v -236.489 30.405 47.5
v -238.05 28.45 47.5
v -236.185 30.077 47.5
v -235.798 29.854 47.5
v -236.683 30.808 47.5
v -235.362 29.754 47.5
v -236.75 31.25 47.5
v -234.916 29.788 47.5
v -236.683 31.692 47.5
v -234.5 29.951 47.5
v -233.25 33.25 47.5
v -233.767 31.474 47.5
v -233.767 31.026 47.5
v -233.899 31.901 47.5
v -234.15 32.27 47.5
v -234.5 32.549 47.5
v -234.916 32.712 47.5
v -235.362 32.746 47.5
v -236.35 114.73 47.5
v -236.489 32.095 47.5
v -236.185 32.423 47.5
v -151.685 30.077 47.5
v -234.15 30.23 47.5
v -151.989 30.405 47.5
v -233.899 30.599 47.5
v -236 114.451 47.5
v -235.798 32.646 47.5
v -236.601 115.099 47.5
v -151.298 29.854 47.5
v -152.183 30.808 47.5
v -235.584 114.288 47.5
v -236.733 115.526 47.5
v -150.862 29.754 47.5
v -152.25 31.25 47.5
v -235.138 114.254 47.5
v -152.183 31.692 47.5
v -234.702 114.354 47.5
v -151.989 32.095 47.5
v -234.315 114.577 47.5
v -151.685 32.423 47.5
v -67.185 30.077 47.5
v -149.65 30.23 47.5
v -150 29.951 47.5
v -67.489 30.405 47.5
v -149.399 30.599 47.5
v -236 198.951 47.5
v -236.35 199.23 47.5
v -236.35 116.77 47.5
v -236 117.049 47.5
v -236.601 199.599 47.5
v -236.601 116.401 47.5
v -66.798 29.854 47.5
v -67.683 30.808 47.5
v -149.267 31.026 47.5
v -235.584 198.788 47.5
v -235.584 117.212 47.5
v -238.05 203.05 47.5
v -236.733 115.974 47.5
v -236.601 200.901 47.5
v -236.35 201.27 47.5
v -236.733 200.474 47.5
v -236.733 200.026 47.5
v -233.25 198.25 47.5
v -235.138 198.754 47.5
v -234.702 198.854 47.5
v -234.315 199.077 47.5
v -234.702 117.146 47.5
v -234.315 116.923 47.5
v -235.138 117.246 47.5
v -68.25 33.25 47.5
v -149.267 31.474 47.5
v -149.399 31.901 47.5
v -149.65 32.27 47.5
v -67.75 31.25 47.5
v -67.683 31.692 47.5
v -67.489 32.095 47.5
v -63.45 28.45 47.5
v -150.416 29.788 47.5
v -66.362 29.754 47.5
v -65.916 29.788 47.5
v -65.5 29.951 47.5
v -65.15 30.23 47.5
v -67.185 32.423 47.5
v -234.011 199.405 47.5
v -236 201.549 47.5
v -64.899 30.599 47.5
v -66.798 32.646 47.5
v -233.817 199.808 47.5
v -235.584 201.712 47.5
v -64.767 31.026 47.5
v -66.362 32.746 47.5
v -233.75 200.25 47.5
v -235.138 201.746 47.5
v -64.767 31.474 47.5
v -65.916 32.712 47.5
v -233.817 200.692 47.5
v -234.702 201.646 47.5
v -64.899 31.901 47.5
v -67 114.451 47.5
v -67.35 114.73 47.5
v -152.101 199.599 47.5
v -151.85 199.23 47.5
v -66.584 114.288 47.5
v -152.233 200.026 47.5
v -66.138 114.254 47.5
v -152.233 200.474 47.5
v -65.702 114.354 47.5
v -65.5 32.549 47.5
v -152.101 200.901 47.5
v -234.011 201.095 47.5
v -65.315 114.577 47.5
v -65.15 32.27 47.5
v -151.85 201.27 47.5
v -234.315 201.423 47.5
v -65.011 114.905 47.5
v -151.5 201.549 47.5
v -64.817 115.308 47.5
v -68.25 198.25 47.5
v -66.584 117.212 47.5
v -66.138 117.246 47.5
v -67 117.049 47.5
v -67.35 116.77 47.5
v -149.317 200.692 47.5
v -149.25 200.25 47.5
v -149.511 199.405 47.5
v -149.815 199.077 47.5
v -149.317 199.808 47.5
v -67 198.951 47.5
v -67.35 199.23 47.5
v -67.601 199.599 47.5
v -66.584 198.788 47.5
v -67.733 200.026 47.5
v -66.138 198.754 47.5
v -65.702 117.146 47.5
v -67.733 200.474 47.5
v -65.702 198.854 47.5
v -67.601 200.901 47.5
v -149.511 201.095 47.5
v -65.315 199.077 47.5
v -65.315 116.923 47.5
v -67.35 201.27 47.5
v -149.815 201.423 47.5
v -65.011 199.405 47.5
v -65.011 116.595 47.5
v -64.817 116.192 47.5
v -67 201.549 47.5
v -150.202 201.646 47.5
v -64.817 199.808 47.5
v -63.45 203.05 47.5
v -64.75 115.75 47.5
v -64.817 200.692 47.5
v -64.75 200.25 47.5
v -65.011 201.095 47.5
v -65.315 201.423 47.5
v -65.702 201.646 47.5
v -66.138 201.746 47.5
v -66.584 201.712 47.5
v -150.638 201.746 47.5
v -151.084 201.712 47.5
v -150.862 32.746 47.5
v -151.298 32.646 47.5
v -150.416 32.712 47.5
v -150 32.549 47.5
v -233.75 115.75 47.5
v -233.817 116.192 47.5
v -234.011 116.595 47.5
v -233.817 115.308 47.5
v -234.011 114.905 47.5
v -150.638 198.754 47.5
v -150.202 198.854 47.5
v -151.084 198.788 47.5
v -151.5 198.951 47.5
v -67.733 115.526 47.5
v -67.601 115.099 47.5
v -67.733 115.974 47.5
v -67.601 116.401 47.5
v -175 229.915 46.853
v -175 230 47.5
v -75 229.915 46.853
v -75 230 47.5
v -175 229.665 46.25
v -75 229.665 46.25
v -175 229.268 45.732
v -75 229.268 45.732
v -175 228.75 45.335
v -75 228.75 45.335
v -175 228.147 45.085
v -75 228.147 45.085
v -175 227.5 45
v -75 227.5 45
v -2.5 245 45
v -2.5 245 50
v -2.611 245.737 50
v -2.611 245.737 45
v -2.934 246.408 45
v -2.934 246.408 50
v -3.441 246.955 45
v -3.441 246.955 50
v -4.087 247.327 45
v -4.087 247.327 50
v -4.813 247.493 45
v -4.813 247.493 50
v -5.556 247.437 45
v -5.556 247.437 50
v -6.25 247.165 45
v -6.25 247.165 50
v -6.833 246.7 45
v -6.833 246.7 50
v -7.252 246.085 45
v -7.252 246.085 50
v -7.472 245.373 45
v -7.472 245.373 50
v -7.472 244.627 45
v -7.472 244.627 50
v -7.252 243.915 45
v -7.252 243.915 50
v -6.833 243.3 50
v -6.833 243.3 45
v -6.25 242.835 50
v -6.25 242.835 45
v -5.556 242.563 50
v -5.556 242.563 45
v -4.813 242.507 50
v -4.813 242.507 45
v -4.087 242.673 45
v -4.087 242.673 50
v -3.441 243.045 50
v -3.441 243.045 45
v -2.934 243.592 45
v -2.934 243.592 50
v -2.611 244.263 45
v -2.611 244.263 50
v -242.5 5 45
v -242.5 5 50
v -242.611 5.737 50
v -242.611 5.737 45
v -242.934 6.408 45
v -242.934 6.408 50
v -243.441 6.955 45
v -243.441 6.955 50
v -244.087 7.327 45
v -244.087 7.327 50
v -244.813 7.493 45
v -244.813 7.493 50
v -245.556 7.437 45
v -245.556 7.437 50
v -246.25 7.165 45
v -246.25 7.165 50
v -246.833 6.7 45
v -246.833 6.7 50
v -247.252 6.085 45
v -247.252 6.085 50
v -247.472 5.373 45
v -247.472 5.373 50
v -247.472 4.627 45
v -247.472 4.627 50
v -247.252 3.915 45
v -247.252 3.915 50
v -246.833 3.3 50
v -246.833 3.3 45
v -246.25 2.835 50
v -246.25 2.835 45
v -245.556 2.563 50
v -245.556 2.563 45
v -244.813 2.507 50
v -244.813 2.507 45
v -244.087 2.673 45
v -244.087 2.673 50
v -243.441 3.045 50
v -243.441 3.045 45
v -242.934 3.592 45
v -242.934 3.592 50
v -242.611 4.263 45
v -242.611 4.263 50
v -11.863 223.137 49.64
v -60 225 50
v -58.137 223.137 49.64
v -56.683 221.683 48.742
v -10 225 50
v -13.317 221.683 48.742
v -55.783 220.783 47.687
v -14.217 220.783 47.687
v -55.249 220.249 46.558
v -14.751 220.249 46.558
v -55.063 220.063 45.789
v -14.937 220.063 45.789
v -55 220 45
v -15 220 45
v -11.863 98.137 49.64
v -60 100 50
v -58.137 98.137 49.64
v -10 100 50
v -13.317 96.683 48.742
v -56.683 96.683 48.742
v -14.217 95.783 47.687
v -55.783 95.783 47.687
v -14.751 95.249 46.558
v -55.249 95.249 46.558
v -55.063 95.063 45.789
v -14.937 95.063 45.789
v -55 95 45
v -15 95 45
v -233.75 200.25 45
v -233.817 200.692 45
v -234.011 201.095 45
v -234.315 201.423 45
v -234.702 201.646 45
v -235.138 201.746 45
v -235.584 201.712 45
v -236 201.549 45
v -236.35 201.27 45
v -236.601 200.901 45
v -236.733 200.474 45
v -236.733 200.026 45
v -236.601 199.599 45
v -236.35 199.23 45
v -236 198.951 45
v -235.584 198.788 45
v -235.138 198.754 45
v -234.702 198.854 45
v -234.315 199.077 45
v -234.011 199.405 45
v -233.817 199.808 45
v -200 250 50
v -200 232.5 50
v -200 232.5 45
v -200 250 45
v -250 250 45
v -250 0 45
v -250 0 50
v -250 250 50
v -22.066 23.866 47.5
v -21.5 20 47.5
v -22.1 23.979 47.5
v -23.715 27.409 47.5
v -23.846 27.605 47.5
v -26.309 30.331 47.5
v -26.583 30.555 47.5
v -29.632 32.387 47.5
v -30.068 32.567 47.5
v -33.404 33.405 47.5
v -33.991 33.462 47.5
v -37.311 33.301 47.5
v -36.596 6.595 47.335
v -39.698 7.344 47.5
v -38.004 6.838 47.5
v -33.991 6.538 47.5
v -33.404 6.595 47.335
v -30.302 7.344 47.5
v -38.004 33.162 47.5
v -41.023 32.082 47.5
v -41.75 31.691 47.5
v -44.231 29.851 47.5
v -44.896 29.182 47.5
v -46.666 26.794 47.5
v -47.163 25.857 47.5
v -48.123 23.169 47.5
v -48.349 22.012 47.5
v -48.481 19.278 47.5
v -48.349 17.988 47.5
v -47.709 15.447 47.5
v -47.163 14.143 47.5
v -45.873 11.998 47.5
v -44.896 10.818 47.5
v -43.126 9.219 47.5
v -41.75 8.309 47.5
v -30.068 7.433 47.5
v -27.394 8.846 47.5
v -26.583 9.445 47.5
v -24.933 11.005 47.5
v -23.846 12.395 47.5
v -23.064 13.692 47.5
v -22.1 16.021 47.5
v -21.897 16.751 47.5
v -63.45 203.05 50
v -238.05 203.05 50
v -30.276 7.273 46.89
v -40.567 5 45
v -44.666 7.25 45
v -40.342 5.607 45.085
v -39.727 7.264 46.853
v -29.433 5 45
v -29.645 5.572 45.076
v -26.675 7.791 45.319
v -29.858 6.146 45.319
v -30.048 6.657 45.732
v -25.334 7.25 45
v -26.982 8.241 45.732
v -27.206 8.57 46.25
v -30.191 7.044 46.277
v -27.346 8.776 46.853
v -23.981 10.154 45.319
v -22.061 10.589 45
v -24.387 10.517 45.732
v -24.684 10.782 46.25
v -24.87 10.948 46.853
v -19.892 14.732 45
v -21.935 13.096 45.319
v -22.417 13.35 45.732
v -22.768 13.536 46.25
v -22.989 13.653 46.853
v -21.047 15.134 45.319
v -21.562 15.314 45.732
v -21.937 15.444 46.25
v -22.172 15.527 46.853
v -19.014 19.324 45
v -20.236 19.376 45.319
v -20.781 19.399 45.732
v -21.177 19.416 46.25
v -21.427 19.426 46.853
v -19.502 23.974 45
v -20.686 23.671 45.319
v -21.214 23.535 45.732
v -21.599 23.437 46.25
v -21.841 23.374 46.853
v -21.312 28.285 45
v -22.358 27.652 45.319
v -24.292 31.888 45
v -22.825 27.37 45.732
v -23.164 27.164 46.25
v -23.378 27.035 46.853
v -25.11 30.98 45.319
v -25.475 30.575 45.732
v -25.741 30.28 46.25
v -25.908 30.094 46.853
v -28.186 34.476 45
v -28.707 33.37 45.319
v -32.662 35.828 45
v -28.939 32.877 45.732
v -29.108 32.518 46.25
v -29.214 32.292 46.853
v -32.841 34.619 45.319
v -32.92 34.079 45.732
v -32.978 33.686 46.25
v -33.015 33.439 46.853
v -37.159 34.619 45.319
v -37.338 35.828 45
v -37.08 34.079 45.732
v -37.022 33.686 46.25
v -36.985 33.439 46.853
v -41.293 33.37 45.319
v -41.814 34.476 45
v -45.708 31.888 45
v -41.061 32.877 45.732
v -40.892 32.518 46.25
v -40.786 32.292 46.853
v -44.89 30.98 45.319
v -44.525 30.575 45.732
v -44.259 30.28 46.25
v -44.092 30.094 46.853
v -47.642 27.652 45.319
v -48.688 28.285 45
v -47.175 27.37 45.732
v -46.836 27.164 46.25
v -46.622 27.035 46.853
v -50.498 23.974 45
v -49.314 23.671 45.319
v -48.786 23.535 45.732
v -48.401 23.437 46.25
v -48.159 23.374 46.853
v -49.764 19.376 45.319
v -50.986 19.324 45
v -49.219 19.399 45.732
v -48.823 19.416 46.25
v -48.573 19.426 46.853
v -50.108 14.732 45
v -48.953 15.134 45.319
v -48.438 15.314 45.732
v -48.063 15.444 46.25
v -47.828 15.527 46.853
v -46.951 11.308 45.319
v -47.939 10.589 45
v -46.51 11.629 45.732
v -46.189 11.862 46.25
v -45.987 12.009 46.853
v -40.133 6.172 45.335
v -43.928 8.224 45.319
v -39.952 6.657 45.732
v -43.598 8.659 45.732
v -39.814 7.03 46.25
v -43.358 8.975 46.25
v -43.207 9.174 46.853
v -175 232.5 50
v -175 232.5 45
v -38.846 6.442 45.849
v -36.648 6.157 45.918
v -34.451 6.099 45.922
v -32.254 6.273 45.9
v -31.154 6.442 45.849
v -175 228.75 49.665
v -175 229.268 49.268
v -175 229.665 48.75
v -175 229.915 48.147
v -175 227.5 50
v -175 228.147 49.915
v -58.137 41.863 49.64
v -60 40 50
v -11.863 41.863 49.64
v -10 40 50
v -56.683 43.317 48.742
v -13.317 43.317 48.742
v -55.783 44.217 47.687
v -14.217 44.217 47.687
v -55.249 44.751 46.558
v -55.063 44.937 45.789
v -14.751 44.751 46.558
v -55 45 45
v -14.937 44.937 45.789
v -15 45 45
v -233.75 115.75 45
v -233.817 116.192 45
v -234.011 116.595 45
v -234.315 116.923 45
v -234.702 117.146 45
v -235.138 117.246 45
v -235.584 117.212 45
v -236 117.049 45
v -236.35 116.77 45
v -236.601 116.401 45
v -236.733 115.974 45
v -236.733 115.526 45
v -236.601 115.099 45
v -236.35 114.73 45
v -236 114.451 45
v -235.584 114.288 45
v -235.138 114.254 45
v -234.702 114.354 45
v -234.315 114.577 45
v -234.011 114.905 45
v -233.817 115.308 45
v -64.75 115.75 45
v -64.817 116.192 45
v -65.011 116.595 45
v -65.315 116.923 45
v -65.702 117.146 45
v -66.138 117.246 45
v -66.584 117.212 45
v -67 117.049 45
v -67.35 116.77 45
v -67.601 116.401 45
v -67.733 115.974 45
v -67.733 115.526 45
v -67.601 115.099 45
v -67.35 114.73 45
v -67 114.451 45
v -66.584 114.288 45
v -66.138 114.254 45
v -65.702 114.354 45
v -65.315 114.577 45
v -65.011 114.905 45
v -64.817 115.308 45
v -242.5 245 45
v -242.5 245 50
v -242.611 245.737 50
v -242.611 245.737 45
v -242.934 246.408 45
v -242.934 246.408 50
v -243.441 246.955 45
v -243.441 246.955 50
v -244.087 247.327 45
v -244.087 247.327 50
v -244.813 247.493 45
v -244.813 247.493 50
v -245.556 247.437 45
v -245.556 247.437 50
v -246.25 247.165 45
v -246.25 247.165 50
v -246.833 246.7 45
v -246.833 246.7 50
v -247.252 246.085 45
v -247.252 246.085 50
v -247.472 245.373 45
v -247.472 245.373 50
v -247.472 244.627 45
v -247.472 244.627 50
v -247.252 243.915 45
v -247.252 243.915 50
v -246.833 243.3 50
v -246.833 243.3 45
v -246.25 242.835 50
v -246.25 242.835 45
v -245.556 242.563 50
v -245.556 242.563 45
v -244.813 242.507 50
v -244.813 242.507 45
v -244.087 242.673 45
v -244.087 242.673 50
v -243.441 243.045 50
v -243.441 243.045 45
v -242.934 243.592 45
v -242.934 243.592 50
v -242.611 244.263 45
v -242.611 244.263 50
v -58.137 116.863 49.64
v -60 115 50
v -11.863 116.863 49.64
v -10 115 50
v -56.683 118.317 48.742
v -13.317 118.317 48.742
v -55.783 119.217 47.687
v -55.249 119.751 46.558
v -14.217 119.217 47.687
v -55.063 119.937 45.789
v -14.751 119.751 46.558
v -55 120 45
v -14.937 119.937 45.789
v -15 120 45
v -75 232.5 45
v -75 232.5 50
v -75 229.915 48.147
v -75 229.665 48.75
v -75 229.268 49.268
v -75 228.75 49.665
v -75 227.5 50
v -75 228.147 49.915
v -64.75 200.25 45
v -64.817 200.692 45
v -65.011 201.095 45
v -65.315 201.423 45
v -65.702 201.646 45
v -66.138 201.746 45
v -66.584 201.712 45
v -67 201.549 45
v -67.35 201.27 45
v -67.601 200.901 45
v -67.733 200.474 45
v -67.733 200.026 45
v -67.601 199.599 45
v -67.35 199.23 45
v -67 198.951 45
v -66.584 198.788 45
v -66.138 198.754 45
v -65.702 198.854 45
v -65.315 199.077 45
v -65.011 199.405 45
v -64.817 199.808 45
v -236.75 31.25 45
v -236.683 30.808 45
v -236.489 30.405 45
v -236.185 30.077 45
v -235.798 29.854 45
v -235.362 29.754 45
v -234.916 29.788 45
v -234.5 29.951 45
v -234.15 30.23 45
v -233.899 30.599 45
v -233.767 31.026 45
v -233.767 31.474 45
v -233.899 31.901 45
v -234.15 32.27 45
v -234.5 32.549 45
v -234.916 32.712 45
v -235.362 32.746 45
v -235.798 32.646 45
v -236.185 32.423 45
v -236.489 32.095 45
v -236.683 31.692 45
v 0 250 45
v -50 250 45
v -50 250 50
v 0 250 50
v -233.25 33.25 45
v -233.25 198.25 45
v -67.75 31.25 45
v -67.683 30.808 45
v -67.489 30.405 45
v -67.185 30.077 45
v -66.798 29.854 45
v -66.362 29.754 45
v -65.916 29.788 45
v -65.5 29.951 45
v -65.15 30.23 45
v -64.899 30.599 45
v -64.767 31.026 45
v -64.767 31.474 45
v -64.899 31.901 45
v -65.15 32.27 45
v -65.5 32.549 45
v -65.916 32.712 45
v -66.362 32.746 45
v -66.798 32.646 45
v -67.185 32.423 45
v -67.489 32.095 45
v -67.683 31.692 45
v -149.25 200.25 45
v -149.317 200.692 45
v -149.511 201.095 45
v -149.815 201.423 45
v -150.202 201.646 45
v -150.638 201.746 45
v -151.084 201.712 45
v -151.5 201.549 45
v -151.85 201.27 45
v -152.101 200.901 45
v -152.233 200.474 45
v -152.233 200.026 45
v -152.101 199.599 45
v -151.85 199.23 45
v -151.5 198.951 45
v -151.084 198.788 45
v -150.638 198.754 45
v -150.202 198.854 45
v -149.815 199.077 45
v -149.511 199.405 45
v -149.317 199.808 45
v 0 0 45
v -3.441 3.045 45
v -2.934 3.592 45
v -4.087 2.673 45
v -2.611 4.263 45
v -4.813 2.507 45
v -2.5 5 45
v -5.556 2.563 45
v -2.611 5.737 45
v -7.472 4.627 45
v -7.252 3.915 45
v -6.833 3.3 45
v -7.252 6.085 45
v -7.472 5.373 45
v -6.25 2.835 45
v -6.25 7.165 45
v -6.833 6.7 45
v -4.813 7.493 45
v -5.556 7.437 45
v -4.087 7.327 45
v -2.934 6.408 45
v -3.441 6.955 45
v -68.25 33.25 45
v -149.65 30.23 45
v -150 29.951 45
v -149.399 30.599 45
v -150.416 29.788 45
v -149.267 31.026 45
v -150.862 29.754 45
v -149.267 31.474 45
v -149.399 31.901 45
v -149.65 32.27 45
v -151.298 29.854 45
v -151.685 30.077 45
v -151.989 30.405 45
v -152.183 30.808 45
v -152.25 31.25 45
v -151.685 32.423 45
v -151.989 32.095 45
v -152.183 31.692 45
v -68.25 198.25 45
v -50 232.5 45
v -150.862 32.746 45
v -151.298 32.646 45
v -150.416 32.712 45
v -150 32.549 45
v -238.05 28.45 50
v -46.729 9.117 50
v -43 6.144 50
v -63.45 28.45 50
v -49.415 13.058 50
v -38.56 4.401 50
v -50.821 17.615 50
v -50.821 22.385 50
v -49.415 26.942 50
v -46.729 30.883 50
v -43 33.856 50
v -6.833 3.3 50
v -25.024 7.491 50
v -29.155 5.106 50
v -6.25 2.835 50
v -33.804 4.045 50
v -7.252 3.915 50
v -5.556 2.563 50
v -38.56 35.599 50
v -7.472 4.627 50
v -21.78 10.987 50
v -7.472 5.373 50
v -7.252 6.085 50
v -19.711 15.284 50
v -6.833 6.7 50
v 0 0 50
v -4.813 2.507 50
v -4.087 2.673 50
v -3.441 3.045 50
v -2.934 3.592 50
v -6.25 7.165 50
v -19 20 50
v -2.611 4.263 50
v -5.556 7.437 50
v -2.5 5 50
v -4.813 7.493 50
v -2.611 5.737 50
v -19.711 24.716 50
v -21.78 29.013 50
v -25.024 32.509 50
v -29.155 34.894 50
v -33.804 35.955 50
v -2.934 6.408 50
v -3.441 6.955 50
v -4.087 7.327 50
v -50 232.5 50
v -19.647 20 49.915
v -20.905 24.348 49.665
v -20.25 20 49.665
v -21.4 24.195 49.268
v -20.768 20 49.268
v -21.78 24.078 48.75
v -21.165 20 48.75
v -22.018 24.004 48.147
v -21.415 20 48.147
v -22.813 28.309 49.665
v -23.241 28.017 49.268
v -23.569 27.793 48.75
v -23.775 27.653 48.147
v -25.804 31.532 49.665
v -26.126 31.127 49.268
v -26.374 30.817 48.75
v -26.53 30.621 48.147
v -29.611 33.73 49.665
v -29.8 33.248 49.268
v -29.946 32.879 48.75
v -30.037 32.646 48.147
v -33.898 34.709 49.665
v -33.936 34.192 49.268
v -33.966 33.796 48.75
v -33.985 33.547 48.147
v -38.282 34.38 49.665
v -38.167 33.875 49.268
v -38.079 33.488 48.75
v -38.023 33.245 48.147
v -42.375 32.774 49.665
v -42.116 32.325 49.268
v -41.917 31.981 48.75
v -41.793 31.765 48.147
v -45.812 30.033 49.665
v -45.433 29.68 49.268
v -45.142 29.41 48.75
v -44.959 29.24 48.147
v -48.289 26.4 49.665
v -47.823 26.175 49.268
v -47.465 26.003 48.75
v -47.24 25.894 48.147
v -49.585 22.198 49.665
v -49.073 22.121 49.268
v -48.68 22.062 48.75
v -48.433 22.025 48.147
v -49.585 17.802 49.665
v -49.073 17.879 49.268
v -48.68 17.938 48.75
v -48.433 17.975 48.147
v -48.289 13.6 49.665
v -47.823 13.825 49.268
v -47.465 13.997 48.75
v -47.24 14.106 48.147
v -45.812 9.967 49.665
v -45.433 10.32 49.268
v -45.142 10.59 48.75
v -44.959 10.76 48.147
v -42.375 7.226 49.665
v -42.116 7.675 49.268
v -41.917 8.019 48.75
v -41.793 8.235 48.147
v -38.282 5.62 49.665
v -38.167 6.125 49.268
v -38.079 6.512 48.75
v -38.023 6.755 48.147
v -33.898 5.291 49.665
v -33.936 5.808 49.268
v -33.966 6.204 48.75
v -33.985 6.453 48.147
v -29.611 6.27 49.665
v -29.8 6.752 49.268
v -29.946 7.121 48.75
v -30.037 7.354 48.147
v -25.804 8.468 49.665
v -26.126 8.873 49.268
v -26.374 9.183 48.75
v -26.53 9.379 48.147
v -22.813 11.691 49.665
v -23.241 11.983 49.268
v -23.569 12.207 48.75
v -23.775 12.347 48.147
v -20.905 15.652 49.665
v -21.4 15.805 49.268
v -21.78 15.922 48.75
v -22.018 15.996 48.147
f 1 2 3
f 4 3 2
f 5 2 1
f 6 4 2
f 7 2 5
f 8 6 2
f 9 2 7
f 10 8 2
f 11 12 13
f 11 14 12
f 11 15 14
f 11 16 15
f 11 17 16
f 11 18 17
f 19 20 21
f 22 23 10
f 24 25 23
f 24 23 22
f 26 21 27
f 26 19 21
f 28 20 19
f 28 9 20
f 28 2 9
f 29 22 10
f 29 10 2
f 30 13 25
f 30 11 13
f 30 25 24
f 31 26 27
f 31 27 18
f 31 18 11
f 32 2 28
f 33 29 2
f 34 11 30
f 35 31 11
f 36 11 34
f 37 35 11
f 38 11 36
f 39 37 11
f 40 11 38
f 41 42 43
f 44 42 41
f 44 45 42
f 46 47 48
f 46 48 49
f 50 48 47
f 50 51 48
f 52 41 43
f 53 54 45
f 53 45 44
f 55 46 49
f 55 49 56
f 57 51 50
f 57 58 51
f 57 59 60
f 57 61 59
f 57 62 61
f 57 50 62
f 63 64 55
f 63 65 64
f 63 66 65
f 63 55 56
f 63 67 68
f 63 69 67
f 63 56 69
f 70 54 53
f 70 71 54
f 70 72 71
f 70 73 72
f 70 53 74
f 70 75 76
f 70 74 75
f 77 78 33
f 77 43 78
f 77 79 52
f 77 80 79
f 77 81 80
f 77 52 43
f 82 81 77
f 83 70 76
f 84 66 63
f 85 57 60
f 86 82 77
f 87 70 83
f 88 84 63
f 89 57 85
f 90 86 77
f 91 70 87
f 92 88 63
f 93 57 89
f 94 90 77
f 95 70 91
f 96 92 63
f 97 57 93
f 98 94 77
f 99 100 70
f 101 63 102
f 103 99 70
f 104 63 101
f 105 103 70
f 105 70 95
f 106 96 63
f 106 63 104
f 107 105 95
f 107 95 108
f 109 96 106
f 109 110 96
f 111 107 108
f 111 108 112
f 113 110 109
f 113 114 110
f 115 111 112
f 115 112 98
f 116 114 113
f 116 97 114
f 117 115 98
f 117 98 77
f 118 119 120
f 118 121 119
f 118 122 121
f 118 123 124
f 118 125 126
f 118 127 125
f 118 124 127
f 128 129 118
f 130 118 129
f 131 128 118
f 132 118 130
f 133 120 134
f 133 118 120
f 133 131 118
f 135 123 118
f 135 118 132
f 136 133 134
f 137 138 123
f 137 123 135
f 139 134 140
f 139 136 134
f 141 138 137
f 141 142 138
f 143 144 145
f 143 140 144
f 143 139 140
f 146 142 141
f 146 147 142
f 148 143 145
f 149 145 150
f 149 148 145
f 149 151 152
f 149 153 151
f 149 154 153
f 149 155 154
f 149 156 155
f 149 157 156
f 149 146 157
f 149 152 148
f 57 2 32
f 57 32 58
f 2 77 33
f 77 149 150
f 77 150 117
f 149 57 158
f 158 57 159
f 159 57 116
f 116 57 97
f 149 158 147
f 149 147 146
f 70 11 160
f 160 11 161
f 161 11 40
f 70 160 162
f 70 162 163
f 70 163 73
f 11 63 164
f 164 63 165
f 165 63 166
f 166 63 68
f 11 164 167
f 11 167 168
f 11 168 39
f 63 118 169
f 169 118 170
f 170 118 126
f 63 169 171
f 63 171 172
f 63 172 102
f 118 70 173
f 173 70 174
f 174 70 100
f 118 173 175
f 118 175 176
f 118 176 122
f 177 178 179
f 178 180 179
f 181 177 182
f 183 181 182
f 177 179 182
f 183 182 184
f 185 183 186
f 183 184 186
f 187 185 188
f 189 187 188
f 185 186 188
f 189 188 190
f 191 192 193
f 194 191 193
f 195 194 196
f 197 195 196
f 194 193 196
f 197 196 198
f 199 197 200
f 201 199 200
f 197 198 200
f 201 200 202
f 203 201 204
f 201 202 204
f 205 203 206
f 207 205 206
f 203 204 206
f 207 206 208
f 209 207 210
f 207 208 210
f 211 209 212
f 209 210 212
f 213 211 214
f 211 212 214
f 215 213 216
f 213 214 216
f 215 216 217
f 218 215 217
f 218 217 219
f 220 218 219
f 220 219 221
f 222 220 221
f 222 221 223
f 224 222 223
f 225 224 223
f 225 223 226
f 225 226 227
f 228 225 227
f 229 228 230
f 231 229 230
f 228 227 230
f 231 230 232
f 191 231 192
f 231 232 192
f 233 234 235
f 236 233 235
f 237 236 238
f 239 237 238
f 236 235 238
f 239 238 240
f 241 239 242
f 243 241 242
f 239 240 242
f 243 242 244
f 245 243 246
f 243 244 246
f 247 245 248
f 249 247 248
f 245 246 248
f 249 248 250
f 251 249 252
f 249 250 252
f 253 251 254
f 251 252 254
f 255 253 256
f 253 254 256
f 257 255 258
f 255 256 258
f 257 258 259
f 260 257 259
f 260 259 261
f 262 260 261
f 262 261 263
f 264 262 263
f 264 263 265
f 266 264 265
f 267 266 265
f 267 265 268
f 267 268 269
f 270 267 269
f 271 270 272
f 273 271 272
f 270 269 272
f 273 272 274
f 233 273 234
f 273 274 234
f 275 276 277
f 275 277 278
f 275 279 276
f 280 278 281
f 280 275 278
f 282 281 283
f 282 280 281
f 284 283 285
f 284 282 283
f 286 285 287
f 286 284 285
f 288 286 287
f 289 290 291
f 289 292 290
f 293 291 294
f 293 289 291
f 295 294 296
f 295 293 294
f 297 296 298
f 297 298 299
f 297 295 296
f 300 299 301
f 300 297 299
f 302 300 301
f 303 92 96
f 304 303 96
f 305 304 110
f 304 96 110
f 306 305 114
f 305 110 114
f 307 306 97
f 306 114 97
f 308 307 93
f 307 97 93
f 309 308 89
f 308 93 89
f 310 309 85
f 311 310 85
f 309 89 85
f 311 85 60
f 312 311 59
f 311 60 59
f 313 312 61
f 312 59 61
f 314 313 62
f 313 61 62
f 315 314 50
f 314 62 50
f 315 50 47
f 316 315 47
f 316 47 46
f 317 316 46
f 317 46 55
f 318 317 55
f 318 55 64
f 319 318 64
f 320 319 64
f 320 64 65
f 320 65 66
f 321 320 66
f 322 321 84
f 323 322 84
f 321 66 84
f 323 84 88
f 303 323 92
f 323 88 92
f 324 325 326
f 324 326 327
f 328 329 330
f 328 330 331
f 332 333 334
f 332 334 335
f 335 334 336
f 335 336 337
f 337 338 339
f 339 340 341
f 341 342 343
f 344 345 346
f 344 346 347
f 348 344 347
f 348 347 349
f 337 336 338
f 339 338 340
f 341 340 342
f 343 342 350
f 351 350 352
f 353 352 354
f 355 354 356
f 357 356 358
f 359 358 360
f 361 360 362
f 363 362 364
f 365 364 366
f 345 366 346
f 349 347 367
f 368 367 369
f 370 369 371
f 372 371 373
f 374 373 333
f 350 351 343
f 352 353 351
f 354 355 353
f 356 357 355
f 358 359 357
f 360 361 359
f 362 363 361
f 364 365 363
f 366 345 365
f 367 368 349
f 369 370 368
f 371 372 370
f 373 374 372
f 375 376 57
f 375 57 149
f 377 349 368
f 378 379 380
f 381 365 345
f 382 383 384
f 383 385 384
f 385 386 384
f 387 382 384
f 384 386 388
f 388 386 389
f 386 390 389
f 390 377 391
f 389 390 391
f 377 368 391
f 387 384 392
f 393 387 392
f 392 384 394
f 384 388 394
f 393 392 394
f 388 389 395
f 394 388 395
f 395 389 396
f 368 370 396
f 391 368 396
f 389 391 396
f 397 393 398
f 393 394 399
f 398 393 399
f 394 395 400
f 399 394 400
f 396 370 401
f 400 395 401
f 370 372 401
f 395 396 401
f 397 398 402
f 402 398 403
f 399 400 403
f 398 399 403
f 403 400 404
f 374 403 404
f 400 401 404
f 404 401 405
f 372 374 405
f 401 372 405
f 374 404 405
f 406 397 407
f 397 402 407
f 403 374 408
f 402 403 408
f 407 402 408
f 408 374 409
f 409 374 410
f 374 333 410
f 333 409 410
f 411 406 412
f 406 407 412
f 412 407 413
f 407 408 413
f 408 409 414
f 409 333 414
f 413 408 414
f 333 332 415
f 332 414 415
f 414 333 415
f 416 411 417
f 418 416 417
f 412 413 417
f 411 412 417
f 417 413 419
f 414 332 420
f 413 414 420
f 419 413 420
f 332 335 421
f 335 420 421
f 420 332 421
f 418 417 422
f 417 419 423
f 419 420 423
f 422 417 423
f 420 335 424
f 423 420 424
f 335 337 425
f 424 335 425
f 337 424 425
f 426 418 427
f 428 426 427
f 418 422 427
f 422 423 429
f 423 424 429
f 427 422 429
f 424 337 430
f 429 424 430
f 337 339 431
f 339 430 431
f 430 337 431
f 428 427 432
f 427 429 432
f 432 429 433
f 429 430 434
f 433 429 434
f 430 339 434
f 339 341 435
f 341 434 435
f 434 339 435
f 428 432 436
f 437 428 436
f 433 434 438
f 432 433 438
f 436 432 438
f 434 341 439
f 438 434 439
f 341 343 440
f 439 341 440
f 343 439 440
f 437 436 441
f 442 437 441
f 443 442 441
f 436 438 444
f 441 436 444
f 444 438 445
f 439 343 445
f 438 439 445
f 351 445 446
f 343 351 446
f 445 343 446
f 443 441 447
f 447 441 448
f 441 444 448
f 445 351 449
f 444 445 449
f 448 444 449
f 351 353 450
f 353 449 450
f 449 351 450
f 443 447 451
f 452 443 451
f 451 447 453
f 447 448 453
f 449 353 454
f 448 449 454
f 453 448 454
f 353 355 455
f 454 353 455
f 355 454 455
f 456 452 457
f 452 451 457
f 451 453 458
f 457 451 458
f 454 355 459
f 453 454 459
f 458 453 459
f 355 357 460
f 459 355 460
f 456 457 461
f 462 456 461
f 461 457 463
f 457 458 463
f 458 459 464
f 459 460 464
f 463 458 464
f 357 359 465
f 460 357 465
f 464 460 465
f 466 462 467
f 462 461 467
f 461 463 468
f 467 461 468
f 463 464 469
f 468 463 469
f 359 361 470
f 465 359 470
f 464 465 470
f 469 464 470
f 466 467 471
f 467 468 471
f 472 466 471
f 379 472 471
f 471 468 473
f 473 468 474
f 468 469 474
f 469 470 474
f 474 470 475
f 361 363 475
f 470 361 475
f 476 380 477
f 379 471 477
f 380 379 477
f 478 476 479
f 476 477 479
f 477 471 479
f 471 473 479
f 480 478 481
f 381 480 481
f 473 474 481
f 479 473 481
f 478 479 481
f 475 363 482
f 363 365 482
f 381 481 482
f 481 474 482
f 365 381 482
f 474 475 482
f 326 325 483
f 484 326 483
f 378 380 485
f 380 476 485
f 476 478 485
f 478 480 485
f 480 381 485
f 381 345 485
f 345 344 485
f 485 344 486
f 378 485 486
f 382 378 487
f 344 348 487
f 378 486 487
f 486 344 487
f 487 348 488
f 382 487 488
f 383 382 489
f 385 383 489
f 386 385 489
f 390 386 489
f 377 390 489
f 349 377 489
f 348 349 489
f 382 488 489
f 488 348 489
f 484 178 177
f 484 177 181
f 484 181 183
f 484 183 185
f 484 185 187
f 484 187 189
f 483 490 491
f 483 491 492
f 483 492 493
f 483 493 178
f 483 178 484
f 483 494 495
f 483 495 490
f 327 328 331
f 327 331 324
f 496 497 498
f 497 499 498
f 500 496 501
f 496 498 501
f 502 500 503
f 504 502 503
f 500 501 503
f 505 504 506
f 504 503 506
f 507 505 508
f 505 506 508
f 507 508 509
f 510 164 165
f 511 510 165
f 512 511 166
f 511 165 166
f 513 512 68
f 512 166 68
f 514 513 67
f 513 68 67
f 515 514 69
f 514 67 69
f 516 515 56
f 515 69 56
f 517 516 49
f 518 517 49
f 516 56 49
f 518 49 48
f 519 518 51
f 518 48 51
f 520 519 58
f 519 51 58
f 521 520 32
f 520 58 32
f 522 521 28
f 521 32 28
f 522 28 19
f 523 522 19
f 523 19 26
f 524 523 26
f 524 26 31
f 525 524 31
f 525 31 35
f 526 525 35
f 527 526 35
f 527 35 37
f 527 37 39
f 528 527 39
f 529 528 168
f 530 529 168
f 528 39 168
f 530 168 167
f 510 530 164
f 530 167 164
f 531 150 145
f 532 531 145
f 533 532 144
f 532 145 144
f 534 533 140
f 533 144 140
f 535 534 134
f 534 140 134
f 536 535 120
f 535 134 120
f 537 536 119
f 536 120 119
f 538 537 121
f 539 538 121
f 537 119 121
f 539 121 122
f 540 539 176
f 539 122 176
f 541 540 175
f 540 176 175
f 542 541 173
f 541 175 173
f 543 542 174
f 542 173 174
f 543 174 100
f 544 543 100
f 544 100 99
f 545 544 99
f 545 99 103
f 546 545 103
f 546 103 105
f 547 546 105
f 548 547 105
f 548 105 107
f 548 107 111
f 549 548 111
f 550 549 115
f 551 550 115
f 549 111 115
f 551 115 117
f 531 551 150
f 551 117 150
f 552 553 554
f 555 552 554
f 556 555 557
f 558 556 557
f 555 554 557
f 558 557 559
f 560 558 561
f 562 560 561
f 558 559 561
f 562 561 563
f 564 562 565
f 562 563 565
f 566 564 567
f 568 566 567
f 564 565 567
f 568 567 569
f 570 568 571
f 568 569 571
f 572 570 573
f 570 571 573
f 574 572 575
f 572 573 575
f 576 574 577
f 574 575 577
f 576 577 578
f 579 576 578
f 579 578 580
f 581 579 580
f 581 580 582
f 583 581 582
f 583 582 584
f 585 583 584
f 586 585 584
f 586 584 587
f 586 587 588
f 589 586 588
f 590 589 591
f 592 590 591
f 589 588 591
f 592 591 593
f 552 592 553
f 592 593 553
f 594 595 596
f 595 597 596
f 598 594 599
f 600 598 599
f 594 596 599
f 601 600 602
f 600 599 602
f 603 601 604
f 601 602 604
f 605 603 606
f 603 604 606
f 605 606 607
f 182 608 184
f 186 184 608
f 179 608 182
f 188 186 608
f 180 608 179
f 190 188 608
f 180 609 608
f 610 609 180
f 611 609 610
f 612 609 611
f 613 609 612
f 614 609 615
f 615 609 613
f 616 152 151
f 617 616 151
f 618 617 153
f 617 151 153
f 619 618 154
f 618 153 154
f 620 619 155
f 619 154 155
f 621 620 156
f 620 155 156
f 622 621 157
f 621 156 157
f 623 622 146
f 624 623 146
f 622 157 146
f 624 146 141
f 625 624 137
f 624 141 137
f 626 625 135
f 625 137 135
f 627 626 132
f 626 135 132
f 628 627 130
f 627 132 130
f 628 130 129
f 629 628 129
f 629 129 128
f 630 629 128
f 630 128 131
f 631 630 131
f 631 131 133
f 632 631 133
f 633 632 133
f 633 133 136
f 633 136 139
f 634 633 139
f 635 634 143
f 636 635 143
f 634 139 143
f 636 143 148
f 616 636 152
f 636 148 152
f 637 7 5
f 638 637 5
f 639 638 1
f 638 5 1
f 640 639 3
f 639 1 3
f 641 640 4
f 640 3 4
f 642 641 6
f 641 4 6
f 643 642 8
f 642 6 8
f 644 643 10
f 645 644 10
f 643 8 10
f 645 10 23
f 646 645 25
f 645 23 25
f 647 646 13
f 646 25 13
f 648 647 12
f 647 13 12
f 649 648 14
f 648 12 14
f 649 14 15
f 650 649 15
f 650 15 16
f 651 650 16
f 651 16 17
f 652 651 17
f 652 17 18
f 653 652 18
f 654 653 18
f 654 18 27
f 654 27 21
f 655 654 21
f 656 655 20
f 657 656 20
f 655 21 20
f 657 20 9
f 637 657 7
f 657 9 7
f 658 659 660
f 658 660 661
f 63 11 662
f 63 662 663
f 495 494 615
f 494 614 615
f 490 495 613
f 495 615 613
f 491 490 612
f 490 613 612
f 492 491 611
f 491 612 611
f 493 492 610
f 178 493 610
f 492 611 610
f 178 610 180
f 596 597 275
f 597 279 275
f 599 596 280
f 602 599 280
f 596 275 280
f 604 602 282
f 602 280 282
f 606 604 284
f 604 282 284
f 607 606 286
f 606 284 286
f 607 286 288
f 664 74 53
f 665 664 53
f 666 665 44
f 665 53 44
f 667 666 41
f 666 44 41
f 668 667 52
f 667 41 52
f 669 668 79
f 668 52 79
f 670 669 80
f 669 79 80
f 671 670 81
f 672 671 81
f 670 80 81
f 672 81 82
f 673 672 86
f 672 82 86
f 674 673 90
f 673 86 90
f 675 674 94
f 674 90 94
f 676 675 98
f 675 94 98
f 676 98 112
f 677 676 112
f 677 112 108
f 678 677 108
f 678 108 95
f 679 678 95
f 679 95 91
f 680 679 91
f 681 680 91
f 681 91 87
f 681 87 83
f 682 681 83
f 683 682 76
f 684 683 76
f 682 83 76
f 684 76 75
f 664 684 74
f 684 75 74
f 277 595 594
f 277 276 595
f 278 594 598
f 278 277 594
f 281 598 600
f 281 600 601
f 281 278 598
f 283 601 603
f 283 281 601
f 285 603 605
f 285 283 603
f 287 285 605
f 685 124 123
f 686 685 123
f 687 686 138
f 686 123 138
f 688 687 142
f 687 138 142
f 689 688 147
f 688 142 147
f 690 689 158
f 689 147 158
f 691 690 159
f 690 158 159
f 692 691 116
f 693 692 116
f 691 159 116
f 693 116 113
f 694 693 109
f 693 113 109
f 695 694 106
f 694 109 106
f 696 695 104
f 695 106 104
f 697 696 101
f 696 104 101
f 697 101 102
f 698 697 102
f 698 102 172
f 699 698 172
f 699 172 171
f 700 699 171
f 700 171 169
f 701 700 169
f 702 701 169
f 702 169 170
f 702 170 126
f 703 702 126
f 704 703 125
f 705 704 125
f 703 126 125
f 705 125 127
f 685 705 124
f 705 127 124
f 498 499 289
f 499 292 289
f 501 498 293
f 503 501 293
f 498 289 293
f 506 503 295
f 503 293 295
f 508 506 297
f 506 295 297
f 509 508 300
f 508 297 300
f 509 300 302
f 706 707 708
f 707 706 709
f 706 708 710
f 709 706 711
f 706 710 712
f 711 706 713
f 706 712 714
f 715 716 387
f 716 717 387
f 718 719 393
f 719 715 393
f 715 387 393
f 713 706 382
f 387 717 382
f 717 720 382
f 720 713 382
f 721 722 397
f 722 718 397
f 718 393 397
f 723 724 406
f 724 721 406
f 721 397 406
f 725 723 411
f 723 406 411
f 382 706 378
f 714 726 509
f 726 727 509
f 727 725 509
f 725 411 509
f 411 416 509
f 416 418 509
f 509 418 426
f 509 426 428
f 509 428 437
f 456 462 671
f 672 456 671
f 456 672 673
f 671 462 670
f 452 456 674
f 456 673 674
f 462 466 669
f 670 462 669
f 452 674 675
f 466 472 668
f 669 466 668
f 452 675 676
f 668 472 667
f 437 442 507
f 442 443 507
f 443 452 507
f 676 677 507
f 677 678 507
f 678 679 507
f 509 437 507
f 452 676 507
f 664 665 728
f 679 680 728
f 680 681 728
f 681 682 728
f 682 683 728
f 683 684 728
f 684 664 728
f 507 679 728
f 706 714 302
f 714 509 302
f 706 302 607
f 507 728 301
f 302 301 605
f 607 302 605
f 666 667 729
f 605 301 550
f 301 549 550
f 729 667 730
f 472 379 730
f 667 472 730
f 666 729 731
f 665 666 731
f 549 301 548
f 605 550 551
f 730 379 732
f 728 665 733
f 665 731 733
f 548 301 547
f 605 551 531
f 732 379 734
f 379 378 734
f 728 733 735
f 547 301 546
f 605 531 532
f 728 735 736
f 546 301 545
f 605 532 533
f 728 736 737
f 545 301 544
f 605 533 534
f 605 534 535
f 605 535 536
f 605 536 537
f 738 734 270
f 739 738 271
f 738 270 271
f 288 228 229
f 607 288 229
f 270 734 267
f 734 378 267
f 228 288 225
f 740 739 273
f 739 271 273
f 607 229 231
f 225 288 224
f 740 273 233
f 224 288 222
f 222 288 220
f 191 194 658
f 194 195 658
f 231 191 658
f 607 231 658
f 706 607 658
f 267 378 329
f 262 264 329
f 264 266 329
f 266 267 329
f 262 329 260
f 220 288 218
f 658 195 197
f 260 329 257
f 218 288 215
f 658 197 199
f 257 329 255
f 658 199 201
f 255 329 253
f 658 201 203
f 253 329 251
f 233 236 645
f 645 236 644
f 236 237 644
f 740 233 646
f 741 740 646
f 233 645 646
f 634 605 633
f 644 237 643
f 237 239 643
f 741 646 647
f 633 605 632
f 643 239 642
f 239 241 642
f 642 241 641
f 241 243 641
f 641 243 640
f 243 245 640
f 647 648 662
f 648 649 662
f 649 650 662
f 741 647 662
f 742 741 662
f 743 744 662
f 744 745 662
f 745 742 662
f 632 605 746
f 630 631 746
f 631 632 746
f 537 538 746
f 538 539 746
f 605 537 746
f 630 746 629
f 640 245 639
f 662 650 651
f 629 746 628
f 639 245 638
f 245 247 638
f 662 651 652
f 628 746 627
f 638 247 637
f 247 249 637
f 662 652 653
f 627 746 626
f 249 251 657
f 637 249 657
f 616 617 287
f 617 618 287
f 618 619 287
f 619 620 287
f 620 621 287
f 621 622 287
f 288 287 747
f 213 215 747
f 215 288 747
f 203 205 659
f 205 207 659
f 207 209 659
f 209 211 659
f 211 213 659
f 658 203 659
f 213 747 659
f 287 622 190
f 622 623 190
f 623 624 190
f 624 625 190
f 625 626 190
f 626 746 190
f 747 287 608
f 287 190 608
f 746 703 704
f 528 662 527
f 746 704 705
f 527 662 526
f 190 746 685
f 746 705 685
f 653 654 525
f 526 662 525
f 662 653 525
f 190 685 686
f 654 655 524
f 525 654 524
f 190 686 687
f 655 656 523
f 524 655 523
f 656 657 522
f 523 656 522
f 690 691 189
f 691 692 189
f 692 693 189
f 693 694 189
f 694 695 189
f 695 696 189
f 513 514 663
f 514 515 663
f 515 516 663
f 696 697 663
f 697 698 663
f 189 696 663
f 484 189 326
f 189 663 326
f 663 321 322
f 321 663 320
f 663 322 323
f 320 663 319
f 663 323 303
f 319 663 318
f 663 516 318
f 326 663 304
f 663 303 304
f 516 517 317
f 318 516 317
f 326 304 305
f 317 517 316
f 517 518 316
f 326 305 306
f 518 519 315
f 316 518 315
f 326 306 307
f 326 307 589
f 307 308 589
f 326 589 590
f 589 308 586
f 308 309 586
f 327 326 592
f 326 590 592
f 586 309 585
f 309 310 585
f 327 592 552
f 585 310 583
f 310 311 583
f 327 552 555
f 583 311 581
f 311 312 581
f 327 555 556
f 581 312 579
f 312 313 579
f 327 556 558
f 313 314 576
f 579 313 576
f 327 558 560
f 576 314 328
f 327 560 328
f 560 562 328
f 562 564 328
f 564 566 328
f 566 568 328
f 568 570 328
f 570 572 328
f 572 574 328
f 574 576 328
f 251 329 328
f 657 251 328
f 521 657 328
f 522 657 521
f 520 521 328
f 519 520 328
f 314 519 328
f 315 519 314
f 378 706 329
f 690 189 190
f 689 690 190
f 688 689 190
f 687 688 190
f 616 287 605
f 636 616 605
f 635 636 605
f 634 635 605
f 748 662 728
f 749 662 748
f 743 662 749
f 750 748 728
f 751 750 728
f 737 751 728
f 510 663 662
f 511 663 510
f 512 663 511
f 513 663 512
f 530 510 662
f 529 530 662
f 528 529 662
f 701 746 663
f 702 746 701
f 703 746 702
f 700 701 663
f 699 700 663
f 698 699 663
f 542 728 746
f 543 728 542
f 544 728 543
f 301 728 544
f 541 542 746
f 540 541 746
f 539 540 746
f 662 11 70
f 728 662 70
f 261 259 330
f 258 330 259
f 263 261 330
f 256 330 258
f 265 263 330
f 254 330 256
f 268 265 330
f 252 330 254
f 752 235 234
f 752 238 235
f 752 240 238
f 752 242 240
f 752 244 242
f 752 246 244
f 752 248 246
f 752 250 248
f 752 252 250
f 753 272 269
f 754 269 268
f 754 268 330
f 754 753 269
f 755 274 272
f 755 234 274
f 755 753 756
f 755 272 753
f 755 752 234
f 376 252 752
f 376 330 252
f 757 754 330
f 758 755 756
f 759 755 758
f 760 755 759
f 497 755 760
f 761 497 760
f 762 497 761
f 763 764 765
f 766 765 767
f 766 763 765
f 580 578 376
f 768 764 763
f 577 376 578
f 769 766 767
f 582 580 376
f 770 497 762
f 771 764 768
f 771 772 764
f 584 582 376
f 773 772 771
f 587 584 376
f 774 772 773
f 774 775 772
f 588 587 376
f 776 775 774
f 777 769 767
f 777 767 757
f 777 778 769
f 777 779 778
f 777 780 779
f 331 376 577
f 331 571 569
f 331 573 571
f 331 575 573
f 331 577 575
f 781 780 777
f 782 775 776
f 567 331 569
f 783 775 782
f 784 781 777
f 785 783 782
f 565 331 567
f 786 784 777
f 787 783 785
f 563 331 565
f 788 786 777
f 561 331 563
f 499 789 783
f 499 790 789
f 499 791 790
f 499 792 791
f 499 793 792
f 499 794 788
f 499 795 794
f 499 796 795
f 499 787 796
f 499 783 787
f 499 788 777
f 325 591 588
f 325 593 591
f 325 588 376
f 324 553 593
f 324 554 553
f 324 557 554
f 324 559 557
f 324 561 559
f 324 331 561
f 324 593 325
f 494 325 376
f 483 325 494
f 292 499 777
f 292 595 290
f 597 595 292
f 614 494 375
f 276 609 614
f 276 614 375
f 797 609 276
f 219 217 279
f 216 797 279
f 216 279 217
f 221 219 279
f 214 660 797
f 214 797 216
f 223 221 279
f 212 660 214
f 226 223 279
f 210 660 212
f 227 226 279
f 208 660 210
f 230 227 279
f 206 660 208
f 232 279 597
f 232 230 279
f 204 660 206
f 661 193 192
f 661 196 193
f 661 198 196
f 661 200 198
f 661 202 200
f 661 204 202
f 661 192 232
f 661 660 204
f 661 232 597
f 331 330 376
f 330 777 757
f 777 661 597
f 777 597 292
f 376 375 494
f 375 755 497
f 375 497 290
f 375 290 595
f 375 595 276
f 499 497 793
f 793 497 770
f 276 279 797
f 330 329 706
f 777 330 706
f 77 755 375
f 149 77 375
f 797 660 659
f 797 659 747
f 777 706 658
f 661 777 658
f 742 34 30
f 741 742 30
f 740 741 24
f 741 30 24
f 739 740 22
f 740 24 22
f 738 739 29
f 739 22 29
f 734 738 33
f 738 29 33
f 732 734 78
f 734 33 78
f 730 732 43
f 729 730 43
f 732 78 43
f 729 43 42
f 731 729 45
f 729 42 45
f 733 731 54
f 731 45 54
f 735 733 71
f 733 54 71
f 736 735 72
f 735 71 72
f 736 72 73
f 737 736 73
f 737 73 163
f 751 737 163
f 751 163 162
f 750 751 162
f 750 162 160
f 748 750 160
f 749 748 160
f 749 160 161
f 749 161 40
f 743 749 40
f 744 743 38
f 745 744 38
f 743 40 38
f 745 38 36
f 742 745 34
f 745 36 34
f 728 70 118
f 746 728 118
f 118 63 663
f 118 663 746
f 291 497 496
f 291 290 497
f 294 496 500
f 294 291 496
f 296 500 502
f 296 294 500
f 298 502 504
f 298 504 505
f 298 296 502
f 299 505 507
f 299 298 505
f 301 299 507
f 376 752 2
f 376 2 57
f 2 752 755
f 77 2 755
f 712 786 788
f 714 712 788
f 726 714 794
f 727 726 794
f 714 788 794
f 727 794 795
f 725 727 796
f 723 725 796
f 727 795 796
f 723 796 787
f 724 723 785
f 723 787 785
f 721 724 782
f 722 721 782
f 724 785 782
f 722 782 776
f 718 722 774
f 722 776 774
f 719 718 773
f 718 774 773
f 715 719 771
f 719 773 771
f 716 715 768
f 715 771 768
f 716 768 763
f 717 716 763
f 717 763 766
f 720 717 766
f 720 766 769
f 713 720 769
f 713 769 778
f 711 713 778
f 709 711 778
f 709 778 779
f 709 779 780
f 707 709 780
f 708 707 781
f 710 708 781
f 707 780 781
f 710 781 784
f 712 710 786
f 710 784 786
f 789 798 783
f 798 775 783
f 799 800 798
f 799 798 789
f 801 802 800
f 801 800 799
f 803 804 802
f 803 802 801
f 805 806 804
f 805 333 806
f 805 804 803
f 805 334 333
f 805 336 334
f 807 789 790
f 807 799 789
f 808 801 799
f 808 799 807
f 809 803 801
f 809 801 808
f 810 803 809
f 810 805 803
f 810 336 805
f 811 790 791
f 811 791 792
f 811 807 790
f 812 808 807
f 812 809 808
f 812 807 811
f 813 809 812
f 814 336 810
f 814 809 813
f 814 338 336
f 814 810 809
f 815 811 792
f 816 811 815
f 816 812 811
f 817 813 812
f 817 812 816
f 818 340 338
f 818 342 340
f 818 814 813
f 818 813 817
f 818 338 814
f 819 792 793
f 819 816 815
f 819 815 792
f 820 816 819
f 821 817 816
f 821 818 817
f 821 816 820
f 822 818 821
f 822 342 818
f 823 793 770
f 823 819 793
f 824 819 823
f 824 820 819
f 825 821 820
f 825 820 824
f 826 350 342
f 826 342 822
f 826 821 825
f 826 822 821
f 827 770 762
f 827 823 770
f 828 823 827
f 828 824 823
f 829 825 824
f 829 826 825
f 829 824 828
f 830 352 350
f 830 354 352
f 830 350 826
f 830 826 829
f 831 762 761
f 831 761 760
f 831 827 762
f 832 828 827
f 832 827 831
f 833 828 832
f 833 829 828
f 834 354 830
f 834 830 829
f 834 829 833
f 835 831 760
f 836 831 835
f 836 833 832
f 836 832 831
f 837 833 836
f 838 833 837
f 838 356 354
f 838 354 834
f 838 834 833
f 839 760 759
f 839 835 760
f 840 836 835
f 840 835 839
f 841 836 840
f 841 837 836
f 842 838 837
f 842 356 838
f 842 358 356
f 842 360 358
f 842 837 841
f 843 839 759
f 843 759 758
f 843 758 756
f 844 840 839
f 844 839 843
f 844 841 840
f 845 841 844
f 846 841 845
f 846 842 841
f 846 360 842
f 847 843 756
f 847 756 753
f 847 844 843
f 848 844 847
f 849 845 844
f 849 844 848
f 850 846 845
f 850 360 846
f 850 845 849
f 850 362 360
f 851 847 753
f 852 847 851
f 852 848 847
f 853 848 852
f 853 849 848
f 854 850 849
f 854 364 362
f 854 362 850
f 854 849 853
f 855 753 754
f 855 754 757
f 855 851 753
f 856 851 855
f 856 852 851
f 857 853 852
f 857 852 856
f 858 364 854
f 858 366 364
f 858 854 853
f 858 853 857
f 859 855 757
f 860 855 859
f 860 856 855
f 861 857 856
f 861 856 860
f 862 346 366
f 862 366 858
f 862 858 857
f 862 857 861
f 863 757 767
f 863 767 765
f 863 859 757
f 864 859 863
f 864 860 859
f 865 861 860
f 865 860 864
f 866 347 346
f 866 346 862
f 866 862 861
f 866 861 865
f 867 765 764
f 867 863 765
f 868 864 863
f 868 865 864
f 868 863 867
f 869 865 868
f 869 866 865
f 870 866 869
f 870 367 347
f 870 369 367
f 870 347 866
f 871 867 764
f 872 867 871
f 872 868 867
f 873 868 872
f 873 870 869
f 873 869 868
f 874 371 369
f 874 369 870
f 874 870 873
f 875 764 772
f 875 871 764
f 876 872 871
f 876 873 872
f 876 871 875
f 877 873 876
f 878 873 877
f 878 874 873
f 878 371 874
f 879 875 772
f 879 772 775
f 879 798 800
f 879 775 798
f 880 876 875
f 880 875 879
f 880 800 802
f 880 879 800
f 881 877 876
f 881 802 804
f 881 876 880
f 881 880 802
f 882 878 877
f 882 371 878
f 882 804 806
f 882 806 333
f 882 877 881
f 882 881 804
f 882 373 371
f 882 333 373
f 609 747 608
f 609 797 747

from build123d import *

# Parameters (mm, degrees)
SKETCH1_W                        = 250
SKETCH1_H                        = 250
BOSS_EXTRUDE1_DEPTH              = 50
SKETCH2_W                        = 40
SKETCH2_H                        = 100
SKETCH2_H_2                      = 50
CUT_EXTRUDE1_DEPTH               = 45
FILLET1_R                        = 5
FILLET2_R                        = 5
SKETCH5_R                        = 6.25
CUT_EXTRUDE2_DEPTH               = 22
FILLET5_R                        = 1.5
LPATTERN4_COUNT                  = 10
LPATTERN4_PITCH                  = 16.5
LPATTERN4_COUNT_DIR2             = 10
LPATTERN4_PITCH_DIR2             = 16.5
FILLET5_OF_LPATTERN4_R           = 1.5
CUT_EXTRUDE4_DEPTH               = 45
SKETCH8_W                        = 100
SKETCH8_H                        = 20
CUT_EXTRUDE5_DEPTH               = 30
FILLET6_R                        = 2.5
FILLET7_R                        = 2
SKETCH10_R                       = 13.5
CUT_EXTRUDE6_DEPTH               = 358.071421427
SKETCH4_W                        = 25
SKETCH4_H                        = 17.5
CUT_EXTRUDE7_DEPTH               = 10
VERRUNDUNG1_R                    = 2.5
SKIZZE2_W                        = 25
SKIZZE2_H                        = 5
AUFSATZ_LINEAR_AUSTRAGEN1_DEPTH  = 12.5
AUFSATZ_LINEAR_AUSTRAGEN2_DEPTH  = 10
SKIZZE11_W                       = 164
SKIZZE11_H                       = 164
SCHNITT_LINEAR_AUSTRAGEN6_DEPTH  = 10
SKIZZE12_W                       = 174
SKIZZE12_H                       = 174
SCHNITT_LINEAR_AUSTRAGEN7_DEPTH  = 2.5
SKIZZE13_R                       = 1.5
SCHNITT_LINEAR_AUSTRAGEN8_DEPTH  = 2.5
SKIZZE14_W                       = 10
SKIZZE14_H                       = 10
AUFSATZ_LINEAR_AUSTRAGEN3_DEPTH  = 45
SKIZZE16_W                       = 45
SKIZZE16_H                       = 250
SCHNITT_LINEAR_AUSTRAGEN9_DEPTH  = 358.071421427
SKIZZE17_R                       = 2.5
SCHNITT_LINEAR_AUSTRAGEN10_DEPTH = 5
SKIZZE18_W                       = 174.6
SKIZZE18_H                       = 174.6
SCHNITT_LINEAR_AUSTRAGEN11_DEPTH = 2.5
SKIZZE19_W                       = 165
SKIZZE19_H                       = 165
SCHNITT_LINEAR_AUSTRAGEN12_DEPTH = 2.5


with BuildPart() as part:
    # Sketch1 → Boss-Extrude1 (new body)
    with BuildSketch(Plane.XY):
        with Locations((-125, 125)):
            Rectangle(SKETCH1_W, SKETCH1_H)
    extrude(amount=BOSS_EXTRUDE1_DEPTH)

    # Sketch2 → Cut-Extrude1 (cut)
    with BuildSketch(Plane.XY.offset(50)):
        with Locations((-35, 170)):
            Rectangle(SKETCH2_W, SKETCH2_H)
        with Locations((-35, 70)):
            Rectangle(SKETCH2_W, SKETCH2_H_2)
    extrude(amount=-CUT_EXTRUDE1_DEPTH, mode=Mode.SUBTRACT)

    # Fillet1
    fillet1_edges = [part.edges().sort_by_distance(p)[0] for p in [
        (-55, 170, 50),
        (-35, 120, 50),
        (-15, 170, 50),
        (-35, 220, 50),
    ]]
    fillet(fillet1_edges, radius=FILLET1_R)

    # Fillet2
    fillet2_edges = [part.edges().sort_by_distance(p)[0] for p in [
        (-55, 70, 50),
        (-35, 45, 50),
        (-15, 70, 50),
        (-35, 95, 50),
    ]]
    fillet(fillet2_edges, radius=FILLET2_R)

    # Sketch5 → Cut-Extrude2 (cut)
    with BuildSketch(Plane.XY.offset(50)):
        with Locations((-225, 190)):
            Circle(SKETCH5_R)
    cut_extrude2 = extrude(amount=-CUT_EXTRUDE2_DEPTH, mode=Mode.SUBTRACT)

    # Fillet5
    fillet5_edges = [part.edges().sort_by_distance(p)[0] for p in [
        (-231.25, 190, 50),
    ]]
    fillet(fillet5_edges, radius=FILLET5_R)

    # LPattern4: Cut-Extrude2 10 × 10
    with Locations(*[(i * LPATTERN4_PITCH, -j * LPATTERN4_PITCH_DIR2, 0) for i in range(LPATTERN4_COUNT) for j in range(LPATTERN4_COUNT_DIR2) if (i, j) != (0, 0)]):
        add(cut_extrude2, mode=Mode.SUBTRACT)

    # Fillet5 of LPattern4
    fillet5_of_lpattern4_edges = [part.edges().sort_by_distance(p)[0] for p in [
        (-231.25, 173.5, 50),
        (-231.25, 157, 50),
        (-231.25, 140.5, 50),
        (-231.25, 124, 50),
        (-231.25, 107.5, 50),
        (-231.25, 91, 50),
        (-231.25, 74.5, 50),
        (-231.25, 58, 50),
        (-231.25, 41.5, 50),
        (-214.75, 190, 50),
        (-214.75, 173.5, 50),
        (-214.75, 157, 50),
        (-214.75, 140.5, 50),
        (-214.75, 124, 50),
        (-214.75, 107.5, 50),
        (-214.75, 91, 50),
        (-214.75, 74.5, 50),
        (-214.75, 58, 50),
        (-214.75, 41.5, 50),
        (-198.25, 190, 50),
        (-198.25, 173.5, 50),
        (-198.25, 157, 50),
        (-198.25, 140.5, 50),
        (-198.25, 124, 50),
        (-198.25, 107.5, 50),
        (-198.25, 91, 50),
        (-198.25, 74.5, 50),
        (-198.25, 58, 50),
        (-198.25, 41.5, 50),
        (-181.75, 190, 50),
        (-181.75, 173.5, 50),
        (-181.75, 157, 50),
        (-181.75, 140.5, 50),
        (-181.75, 124, 50),
        (-181.75, 107.5, 50),
        (-181.75, 91, 50),
        (-181.75, 74.5, 50),
        (-181.75, 58, 50),
        (-181.75, 41.5, 50),
        (-165.25, 190, 50),
        (-165.25, 173.5, 50),
        (-165.25, 157, 50),
        (-165.25, 140.5, 50),
        (-165.25, 124, 50),
        (-165.25, 107.5, 50),
        (-165.25, 91, 50),
        (-165.25, 74.5, 50),
        (-165.25, 58, 50),
        (-165.25, 41.5, 50),
        (-148.75, 190, 50),
        (-148.75, 173.5, 50),
        (-148.75, 157, 50),
        (-148.75, 140.5, 50),
        (-148.75, 124, 50),
        (-148.75, 107.5, 50),
        (-148.75, 91, 50),
        (-148.75, 74.5, 50),
        (-148.75, 58, 50),
        (-148.75, 41.5, 50),
        (-132.25, 190, 50),
        (-132.25, 173.5, 50),
        (-132.25, 157, 50),
        (-132.25, 140.5, 50),
        (-132.25, 124, 50),
        (-132.25, 107.5, 50),
        (-132.25, 91, 50),
        (-132.25, 74.5, 50),
        (-132.25, 58, 50),
        (-132.25, 41.5, 50),
        (-115.75, 190, 50),
        (-115.75, 173.5, 50),
        (-115.75, 157, 50),
        (-115.75, 140.5, 50),
        (-115.75, 124, 50),
        (-115.75, 107.5, 50),
        (-115.75, 91, 50),
        (-115.75, 74.5, 50),
        (-115.75, 58, 50),
        (-115.75, 41.5, 50),
        (-99.25, 190, 50),
        (-99.25, 173.5, 50),
        (-99.25, 157, 50),
        (-99.25, 140.5, 50),
        (-99.25, 124, 50),
        (-99.25, 107.5, 50),
        (-99.25, 91, 50),
        (-99.25, 74.5, 50),
        (-99.25, 58, 50),
        (-99.25, 41.5, 50),
        (-82.75, 190, 50),
        (-82.75, 173.5, 50),
        (-82.75, 157, 50),
        (-82.75, 140.5, 50),
        (-82.75, 124, 50),
        (-82.75, 107.5, 50),
        (-82.75, 91, 50),
        (-82.75, 74.5, 50),
        (-82.75, 58, 50),
        (-82.75, 41.5, 50),
    ]]
    fillet(fillet5_of_lpattern4_edges, radius=FILLET5_OF_LPATTERN4_R)

    # Sketch7 → Cut-Extrude4 (cut)
    with BuildSketch(Plane(origin=(0, 0, 0), x_dir=(-1, 0, 0), z_dir=(0, 0, -1))):
        Polygon((5, 245), (245, 245), (245, 5), (5, 5), (5, 40), (60, 40), (60, 100), (5, 100), (5, 115), (60, 115), (60, 225), (5, 225), align=None)
    extrude(amount=-CUT_EXTRUDE4_DEPTH, mode=Mode.SUBTRACT)

    # Sketch8 → Cut-Extrude5 (cut)
    with BuildSketch(Plane.XY.offset(50)):
        with Locations((-125, 240)):
            Rectangle(SKETCH8_W, SKETCH8_H)
    extrude(amount=-CUT_EXTRUDE5_DEPTH, mode=Mode.SUBTRACT)

    # Fillet6
    fillet6_edges = [part.edges().sort_by_distance(p)[0] for p in [
        (-125, 230, 45),
        (-125, 230, 50),
    ]]
    fillet(fillet6_edges, radius=FILLET6_R - 0.0001)  # a hair under: the kernel refuses the full size

    # Fillet7
    fillet7_edges = [part.edges().sort_by_distance(p)[0] for p in [
        (-125, 245, 20),
        (-125, 250, 20),
    ]]
    fillet(fillet7_edges, radius=FILLET7_R)

    # Sketch10 → Cut-Extrude6 (cut, through all)
    with BuildSketch(Plane.XY.offset(50)):
        with Locations((-35, 20)):
            Circle(SKETCH10_R)
    extrude(amount=-CUT_EXTRUDE6_DEPTH, mode=Mode.SUBTRACT)

    # Sketch4 → Cut-Extrude7 (cut)
    with BuildSketch(Plane.XY.offset(50)):
        with Locations((-187.5, 241.25)):
            Rectangle(SKETCH4_W, SKETCH4_H)
        with Locations((-62.5, 241.25)):
            Rectangle(SKETCH4_W, SKETCH4_H)
    extrude(amount=-CUT_EXTRUDE7_DEPTH, mode=Mode.SUBTRACT)

    # Verrundung1
    verrundung1_edges = [part.edges().sort_by_distance(p)[0] for p in [
        (-48.5, 20, 45),
        (-48.5, 20, 50),
    ]]
    fillet(verrundung1_edges, radius=VERRUNDUNG1_R - 0.0001)  # a hair under: the kernel refuses the full size

    # Skizze2 → Aufsatz-Linear austragen1 (add)
    with BuildSketch(Plane.XZ.offset(-245)):
        with Locations((-187.5, 37.5)):
            Rectangle(SKIZZE2_W, SKIZZE2_H)
        with Locations((-62.5, 37.5)):
            Rectangle(SKIZZE2_W, SKIZZE2_H)
    extrude(amount=AUFSATZ_LINEAR_AUSTRAGEN1_DEPTH)

    # Skizze4 → Aufsatz-Linear austragen2 (add)
    with BuildSketch(Plane(origin=(0, 0, 45), x_dir=(-1, 0, 0), z_dir=(0, 0, -1))):
        Polygon((50, 232.5), (75, 232.5), (75, 227.5), (49, 227.5), (49, 245), (50, 245), align=None)
        Polygon((200, 232.5), (175, 232.5), (175, 227.5), (201, 227.5), (201, 245), (200, 245), align=None)
    extrude(amount=AUFSATZ_LINEAR_AUSTRAGEN2_DEPTH)

    # Skizze11 → Schnitt-Linear austragen6 (cut)
    with BuildSketch(Plane.XY.offset(50)):
        with Locations((-150.75, 115.75)):
            Rectangle(SKIZZE11_W, SKIZZE11_H)
    extrude(amount=-SCHNITT_LINEAR_AUSTRAGEN6_DEPTH, mode=Mode.SUBTRACT)

    # Skizze12 → Schnitt-Linear austragen7 (cut)
    with BuildSketch(Plane.XY.offset(50)):
        with Locations((-150.75, 115.75)):
            Rectangle(SKIZZE12_W, SKIZZE12_H)
    extrude(amount=-SCHNITT_LINEAR_AUSTRAGEN7_DEPTH, mode=Mode.SUBTRACT)

    # Skizze13 → Schnitt-Linear austragen8 (cut)
    with BuildSketch(Plane.XY.offset(47.5)):
        with Locations((-235.25, 200.25)):
            Circle(SKIZZE13_R)
        with Locations((-150.75, 200.25)):
            Circle(SKIZZE13_R)
        with Locations((-66.25, 200.25)):
            Circle(SKIZZE13_R)
        with Locations((-235.25, 115.75)):
            Circle(SKIZZE13_R)
        with Locations((-66.25, 115.75)):
            Circle(SKIZZE13_R)
        with Locations(Location((-66.25, 31.25, 0), (0, 0, 180))):
            Circle(SKIZZE13_R)
        with Locations(Location((-150.75, 31.25, 0), (0, 0, 180))):
            Circle(SKIZZE13_R)
        with Locations(Location((-235.25, 31.25, 0), (0, 0, 180))):
            Circle(SKIZZE13_R)
    extrude(amount=-SCHNITT_LINEAR_AUSTRAGEN8_DEPTH, mode=Mode.SUBTRACT)

    # Skizze14 → Aufsatz-Linear austragen3 (add)
    with BuildSketch(Plane(origin=(0, 0, 45), x_dir=(-1, 0, 0), z_dir=(0, 0, -1))):
        with Locations((5, 245)):
            Rectangle(SKIZZE14_W, SKIZZE14_H)
        with Locations((245, 245)):
            Rectangle(SKIZZE14_W, SKIZZE14_H)
        with Locations((245, 5)):
            Rectangle(SKIZZE14_W, SKIZZE14_H)
        with Locations((5, 5)):
            Rectangle(SKIZZE14_W, SKIZZE14_H)
    extrude(amount=AUFSATZ_LINEAR_AUSTRAGEN3_DEPTH)

    # Skizze16 → Schnitt-Linear austragen9 (cut, through all)
    with BuildSketch(Plane.ZY.offset(250)):
        with Locations((22.5, 125)):
            Rectangle(SKIZZE16_W, SKIZZE16_H)
    extrude(amount=-SCHNITT_LINEAR_AUSTRAGEN9_DEPTH, mode=Mode.SUBTRACT)

    # Skizze17 → Schnitt-Linear austragen10 (cut)
    with BuildSketch(Plane.XY.offset(50)):
        with Locations((-245, 245)):
            Circle(SKIZZE17_R)
        with Locations((-5, 245)):
            Circle(SKIZZE17_R)
        with Locations((-5, 5)):
            Circle(SKIZZE17_R)
        with Locations((-245, 5)):
            Circle(SKIZZE17_R)
    extrude(amount=-SCHNITT_LINEAR_AUSTRAGEN10_DEPTH, mode=Mode.SUBTRACT)

    # Skizze18 → Schnitt-Linear austragen11 (cut)
    with BuildSketch(Plane.XY.offset(50)):
        with Locations((-150.75, 115.75)):
            Rectangle(SKIZZE18_W, SKIZZE18_H)
    extrude(amount=-SCHNITT_LINEAR_AUSTRAGEN11_DEPTH, mode=Mode.SUBTRACT)

    # Skizze19 → Schnitt-Linear austragen12 (cut)
    with BuildSketch(Plane.XY.offset(47.5)):
        with Locations((-150.75, 115.75)):
            Rectangle(SKIZZE19_W, SKIZZE19_H)
    extrude(amount=-SCHNITT_LINEAR_AUSTRAGEN12_DEPTH, mode=Mode.SUBTRACT)


solid = part.part
